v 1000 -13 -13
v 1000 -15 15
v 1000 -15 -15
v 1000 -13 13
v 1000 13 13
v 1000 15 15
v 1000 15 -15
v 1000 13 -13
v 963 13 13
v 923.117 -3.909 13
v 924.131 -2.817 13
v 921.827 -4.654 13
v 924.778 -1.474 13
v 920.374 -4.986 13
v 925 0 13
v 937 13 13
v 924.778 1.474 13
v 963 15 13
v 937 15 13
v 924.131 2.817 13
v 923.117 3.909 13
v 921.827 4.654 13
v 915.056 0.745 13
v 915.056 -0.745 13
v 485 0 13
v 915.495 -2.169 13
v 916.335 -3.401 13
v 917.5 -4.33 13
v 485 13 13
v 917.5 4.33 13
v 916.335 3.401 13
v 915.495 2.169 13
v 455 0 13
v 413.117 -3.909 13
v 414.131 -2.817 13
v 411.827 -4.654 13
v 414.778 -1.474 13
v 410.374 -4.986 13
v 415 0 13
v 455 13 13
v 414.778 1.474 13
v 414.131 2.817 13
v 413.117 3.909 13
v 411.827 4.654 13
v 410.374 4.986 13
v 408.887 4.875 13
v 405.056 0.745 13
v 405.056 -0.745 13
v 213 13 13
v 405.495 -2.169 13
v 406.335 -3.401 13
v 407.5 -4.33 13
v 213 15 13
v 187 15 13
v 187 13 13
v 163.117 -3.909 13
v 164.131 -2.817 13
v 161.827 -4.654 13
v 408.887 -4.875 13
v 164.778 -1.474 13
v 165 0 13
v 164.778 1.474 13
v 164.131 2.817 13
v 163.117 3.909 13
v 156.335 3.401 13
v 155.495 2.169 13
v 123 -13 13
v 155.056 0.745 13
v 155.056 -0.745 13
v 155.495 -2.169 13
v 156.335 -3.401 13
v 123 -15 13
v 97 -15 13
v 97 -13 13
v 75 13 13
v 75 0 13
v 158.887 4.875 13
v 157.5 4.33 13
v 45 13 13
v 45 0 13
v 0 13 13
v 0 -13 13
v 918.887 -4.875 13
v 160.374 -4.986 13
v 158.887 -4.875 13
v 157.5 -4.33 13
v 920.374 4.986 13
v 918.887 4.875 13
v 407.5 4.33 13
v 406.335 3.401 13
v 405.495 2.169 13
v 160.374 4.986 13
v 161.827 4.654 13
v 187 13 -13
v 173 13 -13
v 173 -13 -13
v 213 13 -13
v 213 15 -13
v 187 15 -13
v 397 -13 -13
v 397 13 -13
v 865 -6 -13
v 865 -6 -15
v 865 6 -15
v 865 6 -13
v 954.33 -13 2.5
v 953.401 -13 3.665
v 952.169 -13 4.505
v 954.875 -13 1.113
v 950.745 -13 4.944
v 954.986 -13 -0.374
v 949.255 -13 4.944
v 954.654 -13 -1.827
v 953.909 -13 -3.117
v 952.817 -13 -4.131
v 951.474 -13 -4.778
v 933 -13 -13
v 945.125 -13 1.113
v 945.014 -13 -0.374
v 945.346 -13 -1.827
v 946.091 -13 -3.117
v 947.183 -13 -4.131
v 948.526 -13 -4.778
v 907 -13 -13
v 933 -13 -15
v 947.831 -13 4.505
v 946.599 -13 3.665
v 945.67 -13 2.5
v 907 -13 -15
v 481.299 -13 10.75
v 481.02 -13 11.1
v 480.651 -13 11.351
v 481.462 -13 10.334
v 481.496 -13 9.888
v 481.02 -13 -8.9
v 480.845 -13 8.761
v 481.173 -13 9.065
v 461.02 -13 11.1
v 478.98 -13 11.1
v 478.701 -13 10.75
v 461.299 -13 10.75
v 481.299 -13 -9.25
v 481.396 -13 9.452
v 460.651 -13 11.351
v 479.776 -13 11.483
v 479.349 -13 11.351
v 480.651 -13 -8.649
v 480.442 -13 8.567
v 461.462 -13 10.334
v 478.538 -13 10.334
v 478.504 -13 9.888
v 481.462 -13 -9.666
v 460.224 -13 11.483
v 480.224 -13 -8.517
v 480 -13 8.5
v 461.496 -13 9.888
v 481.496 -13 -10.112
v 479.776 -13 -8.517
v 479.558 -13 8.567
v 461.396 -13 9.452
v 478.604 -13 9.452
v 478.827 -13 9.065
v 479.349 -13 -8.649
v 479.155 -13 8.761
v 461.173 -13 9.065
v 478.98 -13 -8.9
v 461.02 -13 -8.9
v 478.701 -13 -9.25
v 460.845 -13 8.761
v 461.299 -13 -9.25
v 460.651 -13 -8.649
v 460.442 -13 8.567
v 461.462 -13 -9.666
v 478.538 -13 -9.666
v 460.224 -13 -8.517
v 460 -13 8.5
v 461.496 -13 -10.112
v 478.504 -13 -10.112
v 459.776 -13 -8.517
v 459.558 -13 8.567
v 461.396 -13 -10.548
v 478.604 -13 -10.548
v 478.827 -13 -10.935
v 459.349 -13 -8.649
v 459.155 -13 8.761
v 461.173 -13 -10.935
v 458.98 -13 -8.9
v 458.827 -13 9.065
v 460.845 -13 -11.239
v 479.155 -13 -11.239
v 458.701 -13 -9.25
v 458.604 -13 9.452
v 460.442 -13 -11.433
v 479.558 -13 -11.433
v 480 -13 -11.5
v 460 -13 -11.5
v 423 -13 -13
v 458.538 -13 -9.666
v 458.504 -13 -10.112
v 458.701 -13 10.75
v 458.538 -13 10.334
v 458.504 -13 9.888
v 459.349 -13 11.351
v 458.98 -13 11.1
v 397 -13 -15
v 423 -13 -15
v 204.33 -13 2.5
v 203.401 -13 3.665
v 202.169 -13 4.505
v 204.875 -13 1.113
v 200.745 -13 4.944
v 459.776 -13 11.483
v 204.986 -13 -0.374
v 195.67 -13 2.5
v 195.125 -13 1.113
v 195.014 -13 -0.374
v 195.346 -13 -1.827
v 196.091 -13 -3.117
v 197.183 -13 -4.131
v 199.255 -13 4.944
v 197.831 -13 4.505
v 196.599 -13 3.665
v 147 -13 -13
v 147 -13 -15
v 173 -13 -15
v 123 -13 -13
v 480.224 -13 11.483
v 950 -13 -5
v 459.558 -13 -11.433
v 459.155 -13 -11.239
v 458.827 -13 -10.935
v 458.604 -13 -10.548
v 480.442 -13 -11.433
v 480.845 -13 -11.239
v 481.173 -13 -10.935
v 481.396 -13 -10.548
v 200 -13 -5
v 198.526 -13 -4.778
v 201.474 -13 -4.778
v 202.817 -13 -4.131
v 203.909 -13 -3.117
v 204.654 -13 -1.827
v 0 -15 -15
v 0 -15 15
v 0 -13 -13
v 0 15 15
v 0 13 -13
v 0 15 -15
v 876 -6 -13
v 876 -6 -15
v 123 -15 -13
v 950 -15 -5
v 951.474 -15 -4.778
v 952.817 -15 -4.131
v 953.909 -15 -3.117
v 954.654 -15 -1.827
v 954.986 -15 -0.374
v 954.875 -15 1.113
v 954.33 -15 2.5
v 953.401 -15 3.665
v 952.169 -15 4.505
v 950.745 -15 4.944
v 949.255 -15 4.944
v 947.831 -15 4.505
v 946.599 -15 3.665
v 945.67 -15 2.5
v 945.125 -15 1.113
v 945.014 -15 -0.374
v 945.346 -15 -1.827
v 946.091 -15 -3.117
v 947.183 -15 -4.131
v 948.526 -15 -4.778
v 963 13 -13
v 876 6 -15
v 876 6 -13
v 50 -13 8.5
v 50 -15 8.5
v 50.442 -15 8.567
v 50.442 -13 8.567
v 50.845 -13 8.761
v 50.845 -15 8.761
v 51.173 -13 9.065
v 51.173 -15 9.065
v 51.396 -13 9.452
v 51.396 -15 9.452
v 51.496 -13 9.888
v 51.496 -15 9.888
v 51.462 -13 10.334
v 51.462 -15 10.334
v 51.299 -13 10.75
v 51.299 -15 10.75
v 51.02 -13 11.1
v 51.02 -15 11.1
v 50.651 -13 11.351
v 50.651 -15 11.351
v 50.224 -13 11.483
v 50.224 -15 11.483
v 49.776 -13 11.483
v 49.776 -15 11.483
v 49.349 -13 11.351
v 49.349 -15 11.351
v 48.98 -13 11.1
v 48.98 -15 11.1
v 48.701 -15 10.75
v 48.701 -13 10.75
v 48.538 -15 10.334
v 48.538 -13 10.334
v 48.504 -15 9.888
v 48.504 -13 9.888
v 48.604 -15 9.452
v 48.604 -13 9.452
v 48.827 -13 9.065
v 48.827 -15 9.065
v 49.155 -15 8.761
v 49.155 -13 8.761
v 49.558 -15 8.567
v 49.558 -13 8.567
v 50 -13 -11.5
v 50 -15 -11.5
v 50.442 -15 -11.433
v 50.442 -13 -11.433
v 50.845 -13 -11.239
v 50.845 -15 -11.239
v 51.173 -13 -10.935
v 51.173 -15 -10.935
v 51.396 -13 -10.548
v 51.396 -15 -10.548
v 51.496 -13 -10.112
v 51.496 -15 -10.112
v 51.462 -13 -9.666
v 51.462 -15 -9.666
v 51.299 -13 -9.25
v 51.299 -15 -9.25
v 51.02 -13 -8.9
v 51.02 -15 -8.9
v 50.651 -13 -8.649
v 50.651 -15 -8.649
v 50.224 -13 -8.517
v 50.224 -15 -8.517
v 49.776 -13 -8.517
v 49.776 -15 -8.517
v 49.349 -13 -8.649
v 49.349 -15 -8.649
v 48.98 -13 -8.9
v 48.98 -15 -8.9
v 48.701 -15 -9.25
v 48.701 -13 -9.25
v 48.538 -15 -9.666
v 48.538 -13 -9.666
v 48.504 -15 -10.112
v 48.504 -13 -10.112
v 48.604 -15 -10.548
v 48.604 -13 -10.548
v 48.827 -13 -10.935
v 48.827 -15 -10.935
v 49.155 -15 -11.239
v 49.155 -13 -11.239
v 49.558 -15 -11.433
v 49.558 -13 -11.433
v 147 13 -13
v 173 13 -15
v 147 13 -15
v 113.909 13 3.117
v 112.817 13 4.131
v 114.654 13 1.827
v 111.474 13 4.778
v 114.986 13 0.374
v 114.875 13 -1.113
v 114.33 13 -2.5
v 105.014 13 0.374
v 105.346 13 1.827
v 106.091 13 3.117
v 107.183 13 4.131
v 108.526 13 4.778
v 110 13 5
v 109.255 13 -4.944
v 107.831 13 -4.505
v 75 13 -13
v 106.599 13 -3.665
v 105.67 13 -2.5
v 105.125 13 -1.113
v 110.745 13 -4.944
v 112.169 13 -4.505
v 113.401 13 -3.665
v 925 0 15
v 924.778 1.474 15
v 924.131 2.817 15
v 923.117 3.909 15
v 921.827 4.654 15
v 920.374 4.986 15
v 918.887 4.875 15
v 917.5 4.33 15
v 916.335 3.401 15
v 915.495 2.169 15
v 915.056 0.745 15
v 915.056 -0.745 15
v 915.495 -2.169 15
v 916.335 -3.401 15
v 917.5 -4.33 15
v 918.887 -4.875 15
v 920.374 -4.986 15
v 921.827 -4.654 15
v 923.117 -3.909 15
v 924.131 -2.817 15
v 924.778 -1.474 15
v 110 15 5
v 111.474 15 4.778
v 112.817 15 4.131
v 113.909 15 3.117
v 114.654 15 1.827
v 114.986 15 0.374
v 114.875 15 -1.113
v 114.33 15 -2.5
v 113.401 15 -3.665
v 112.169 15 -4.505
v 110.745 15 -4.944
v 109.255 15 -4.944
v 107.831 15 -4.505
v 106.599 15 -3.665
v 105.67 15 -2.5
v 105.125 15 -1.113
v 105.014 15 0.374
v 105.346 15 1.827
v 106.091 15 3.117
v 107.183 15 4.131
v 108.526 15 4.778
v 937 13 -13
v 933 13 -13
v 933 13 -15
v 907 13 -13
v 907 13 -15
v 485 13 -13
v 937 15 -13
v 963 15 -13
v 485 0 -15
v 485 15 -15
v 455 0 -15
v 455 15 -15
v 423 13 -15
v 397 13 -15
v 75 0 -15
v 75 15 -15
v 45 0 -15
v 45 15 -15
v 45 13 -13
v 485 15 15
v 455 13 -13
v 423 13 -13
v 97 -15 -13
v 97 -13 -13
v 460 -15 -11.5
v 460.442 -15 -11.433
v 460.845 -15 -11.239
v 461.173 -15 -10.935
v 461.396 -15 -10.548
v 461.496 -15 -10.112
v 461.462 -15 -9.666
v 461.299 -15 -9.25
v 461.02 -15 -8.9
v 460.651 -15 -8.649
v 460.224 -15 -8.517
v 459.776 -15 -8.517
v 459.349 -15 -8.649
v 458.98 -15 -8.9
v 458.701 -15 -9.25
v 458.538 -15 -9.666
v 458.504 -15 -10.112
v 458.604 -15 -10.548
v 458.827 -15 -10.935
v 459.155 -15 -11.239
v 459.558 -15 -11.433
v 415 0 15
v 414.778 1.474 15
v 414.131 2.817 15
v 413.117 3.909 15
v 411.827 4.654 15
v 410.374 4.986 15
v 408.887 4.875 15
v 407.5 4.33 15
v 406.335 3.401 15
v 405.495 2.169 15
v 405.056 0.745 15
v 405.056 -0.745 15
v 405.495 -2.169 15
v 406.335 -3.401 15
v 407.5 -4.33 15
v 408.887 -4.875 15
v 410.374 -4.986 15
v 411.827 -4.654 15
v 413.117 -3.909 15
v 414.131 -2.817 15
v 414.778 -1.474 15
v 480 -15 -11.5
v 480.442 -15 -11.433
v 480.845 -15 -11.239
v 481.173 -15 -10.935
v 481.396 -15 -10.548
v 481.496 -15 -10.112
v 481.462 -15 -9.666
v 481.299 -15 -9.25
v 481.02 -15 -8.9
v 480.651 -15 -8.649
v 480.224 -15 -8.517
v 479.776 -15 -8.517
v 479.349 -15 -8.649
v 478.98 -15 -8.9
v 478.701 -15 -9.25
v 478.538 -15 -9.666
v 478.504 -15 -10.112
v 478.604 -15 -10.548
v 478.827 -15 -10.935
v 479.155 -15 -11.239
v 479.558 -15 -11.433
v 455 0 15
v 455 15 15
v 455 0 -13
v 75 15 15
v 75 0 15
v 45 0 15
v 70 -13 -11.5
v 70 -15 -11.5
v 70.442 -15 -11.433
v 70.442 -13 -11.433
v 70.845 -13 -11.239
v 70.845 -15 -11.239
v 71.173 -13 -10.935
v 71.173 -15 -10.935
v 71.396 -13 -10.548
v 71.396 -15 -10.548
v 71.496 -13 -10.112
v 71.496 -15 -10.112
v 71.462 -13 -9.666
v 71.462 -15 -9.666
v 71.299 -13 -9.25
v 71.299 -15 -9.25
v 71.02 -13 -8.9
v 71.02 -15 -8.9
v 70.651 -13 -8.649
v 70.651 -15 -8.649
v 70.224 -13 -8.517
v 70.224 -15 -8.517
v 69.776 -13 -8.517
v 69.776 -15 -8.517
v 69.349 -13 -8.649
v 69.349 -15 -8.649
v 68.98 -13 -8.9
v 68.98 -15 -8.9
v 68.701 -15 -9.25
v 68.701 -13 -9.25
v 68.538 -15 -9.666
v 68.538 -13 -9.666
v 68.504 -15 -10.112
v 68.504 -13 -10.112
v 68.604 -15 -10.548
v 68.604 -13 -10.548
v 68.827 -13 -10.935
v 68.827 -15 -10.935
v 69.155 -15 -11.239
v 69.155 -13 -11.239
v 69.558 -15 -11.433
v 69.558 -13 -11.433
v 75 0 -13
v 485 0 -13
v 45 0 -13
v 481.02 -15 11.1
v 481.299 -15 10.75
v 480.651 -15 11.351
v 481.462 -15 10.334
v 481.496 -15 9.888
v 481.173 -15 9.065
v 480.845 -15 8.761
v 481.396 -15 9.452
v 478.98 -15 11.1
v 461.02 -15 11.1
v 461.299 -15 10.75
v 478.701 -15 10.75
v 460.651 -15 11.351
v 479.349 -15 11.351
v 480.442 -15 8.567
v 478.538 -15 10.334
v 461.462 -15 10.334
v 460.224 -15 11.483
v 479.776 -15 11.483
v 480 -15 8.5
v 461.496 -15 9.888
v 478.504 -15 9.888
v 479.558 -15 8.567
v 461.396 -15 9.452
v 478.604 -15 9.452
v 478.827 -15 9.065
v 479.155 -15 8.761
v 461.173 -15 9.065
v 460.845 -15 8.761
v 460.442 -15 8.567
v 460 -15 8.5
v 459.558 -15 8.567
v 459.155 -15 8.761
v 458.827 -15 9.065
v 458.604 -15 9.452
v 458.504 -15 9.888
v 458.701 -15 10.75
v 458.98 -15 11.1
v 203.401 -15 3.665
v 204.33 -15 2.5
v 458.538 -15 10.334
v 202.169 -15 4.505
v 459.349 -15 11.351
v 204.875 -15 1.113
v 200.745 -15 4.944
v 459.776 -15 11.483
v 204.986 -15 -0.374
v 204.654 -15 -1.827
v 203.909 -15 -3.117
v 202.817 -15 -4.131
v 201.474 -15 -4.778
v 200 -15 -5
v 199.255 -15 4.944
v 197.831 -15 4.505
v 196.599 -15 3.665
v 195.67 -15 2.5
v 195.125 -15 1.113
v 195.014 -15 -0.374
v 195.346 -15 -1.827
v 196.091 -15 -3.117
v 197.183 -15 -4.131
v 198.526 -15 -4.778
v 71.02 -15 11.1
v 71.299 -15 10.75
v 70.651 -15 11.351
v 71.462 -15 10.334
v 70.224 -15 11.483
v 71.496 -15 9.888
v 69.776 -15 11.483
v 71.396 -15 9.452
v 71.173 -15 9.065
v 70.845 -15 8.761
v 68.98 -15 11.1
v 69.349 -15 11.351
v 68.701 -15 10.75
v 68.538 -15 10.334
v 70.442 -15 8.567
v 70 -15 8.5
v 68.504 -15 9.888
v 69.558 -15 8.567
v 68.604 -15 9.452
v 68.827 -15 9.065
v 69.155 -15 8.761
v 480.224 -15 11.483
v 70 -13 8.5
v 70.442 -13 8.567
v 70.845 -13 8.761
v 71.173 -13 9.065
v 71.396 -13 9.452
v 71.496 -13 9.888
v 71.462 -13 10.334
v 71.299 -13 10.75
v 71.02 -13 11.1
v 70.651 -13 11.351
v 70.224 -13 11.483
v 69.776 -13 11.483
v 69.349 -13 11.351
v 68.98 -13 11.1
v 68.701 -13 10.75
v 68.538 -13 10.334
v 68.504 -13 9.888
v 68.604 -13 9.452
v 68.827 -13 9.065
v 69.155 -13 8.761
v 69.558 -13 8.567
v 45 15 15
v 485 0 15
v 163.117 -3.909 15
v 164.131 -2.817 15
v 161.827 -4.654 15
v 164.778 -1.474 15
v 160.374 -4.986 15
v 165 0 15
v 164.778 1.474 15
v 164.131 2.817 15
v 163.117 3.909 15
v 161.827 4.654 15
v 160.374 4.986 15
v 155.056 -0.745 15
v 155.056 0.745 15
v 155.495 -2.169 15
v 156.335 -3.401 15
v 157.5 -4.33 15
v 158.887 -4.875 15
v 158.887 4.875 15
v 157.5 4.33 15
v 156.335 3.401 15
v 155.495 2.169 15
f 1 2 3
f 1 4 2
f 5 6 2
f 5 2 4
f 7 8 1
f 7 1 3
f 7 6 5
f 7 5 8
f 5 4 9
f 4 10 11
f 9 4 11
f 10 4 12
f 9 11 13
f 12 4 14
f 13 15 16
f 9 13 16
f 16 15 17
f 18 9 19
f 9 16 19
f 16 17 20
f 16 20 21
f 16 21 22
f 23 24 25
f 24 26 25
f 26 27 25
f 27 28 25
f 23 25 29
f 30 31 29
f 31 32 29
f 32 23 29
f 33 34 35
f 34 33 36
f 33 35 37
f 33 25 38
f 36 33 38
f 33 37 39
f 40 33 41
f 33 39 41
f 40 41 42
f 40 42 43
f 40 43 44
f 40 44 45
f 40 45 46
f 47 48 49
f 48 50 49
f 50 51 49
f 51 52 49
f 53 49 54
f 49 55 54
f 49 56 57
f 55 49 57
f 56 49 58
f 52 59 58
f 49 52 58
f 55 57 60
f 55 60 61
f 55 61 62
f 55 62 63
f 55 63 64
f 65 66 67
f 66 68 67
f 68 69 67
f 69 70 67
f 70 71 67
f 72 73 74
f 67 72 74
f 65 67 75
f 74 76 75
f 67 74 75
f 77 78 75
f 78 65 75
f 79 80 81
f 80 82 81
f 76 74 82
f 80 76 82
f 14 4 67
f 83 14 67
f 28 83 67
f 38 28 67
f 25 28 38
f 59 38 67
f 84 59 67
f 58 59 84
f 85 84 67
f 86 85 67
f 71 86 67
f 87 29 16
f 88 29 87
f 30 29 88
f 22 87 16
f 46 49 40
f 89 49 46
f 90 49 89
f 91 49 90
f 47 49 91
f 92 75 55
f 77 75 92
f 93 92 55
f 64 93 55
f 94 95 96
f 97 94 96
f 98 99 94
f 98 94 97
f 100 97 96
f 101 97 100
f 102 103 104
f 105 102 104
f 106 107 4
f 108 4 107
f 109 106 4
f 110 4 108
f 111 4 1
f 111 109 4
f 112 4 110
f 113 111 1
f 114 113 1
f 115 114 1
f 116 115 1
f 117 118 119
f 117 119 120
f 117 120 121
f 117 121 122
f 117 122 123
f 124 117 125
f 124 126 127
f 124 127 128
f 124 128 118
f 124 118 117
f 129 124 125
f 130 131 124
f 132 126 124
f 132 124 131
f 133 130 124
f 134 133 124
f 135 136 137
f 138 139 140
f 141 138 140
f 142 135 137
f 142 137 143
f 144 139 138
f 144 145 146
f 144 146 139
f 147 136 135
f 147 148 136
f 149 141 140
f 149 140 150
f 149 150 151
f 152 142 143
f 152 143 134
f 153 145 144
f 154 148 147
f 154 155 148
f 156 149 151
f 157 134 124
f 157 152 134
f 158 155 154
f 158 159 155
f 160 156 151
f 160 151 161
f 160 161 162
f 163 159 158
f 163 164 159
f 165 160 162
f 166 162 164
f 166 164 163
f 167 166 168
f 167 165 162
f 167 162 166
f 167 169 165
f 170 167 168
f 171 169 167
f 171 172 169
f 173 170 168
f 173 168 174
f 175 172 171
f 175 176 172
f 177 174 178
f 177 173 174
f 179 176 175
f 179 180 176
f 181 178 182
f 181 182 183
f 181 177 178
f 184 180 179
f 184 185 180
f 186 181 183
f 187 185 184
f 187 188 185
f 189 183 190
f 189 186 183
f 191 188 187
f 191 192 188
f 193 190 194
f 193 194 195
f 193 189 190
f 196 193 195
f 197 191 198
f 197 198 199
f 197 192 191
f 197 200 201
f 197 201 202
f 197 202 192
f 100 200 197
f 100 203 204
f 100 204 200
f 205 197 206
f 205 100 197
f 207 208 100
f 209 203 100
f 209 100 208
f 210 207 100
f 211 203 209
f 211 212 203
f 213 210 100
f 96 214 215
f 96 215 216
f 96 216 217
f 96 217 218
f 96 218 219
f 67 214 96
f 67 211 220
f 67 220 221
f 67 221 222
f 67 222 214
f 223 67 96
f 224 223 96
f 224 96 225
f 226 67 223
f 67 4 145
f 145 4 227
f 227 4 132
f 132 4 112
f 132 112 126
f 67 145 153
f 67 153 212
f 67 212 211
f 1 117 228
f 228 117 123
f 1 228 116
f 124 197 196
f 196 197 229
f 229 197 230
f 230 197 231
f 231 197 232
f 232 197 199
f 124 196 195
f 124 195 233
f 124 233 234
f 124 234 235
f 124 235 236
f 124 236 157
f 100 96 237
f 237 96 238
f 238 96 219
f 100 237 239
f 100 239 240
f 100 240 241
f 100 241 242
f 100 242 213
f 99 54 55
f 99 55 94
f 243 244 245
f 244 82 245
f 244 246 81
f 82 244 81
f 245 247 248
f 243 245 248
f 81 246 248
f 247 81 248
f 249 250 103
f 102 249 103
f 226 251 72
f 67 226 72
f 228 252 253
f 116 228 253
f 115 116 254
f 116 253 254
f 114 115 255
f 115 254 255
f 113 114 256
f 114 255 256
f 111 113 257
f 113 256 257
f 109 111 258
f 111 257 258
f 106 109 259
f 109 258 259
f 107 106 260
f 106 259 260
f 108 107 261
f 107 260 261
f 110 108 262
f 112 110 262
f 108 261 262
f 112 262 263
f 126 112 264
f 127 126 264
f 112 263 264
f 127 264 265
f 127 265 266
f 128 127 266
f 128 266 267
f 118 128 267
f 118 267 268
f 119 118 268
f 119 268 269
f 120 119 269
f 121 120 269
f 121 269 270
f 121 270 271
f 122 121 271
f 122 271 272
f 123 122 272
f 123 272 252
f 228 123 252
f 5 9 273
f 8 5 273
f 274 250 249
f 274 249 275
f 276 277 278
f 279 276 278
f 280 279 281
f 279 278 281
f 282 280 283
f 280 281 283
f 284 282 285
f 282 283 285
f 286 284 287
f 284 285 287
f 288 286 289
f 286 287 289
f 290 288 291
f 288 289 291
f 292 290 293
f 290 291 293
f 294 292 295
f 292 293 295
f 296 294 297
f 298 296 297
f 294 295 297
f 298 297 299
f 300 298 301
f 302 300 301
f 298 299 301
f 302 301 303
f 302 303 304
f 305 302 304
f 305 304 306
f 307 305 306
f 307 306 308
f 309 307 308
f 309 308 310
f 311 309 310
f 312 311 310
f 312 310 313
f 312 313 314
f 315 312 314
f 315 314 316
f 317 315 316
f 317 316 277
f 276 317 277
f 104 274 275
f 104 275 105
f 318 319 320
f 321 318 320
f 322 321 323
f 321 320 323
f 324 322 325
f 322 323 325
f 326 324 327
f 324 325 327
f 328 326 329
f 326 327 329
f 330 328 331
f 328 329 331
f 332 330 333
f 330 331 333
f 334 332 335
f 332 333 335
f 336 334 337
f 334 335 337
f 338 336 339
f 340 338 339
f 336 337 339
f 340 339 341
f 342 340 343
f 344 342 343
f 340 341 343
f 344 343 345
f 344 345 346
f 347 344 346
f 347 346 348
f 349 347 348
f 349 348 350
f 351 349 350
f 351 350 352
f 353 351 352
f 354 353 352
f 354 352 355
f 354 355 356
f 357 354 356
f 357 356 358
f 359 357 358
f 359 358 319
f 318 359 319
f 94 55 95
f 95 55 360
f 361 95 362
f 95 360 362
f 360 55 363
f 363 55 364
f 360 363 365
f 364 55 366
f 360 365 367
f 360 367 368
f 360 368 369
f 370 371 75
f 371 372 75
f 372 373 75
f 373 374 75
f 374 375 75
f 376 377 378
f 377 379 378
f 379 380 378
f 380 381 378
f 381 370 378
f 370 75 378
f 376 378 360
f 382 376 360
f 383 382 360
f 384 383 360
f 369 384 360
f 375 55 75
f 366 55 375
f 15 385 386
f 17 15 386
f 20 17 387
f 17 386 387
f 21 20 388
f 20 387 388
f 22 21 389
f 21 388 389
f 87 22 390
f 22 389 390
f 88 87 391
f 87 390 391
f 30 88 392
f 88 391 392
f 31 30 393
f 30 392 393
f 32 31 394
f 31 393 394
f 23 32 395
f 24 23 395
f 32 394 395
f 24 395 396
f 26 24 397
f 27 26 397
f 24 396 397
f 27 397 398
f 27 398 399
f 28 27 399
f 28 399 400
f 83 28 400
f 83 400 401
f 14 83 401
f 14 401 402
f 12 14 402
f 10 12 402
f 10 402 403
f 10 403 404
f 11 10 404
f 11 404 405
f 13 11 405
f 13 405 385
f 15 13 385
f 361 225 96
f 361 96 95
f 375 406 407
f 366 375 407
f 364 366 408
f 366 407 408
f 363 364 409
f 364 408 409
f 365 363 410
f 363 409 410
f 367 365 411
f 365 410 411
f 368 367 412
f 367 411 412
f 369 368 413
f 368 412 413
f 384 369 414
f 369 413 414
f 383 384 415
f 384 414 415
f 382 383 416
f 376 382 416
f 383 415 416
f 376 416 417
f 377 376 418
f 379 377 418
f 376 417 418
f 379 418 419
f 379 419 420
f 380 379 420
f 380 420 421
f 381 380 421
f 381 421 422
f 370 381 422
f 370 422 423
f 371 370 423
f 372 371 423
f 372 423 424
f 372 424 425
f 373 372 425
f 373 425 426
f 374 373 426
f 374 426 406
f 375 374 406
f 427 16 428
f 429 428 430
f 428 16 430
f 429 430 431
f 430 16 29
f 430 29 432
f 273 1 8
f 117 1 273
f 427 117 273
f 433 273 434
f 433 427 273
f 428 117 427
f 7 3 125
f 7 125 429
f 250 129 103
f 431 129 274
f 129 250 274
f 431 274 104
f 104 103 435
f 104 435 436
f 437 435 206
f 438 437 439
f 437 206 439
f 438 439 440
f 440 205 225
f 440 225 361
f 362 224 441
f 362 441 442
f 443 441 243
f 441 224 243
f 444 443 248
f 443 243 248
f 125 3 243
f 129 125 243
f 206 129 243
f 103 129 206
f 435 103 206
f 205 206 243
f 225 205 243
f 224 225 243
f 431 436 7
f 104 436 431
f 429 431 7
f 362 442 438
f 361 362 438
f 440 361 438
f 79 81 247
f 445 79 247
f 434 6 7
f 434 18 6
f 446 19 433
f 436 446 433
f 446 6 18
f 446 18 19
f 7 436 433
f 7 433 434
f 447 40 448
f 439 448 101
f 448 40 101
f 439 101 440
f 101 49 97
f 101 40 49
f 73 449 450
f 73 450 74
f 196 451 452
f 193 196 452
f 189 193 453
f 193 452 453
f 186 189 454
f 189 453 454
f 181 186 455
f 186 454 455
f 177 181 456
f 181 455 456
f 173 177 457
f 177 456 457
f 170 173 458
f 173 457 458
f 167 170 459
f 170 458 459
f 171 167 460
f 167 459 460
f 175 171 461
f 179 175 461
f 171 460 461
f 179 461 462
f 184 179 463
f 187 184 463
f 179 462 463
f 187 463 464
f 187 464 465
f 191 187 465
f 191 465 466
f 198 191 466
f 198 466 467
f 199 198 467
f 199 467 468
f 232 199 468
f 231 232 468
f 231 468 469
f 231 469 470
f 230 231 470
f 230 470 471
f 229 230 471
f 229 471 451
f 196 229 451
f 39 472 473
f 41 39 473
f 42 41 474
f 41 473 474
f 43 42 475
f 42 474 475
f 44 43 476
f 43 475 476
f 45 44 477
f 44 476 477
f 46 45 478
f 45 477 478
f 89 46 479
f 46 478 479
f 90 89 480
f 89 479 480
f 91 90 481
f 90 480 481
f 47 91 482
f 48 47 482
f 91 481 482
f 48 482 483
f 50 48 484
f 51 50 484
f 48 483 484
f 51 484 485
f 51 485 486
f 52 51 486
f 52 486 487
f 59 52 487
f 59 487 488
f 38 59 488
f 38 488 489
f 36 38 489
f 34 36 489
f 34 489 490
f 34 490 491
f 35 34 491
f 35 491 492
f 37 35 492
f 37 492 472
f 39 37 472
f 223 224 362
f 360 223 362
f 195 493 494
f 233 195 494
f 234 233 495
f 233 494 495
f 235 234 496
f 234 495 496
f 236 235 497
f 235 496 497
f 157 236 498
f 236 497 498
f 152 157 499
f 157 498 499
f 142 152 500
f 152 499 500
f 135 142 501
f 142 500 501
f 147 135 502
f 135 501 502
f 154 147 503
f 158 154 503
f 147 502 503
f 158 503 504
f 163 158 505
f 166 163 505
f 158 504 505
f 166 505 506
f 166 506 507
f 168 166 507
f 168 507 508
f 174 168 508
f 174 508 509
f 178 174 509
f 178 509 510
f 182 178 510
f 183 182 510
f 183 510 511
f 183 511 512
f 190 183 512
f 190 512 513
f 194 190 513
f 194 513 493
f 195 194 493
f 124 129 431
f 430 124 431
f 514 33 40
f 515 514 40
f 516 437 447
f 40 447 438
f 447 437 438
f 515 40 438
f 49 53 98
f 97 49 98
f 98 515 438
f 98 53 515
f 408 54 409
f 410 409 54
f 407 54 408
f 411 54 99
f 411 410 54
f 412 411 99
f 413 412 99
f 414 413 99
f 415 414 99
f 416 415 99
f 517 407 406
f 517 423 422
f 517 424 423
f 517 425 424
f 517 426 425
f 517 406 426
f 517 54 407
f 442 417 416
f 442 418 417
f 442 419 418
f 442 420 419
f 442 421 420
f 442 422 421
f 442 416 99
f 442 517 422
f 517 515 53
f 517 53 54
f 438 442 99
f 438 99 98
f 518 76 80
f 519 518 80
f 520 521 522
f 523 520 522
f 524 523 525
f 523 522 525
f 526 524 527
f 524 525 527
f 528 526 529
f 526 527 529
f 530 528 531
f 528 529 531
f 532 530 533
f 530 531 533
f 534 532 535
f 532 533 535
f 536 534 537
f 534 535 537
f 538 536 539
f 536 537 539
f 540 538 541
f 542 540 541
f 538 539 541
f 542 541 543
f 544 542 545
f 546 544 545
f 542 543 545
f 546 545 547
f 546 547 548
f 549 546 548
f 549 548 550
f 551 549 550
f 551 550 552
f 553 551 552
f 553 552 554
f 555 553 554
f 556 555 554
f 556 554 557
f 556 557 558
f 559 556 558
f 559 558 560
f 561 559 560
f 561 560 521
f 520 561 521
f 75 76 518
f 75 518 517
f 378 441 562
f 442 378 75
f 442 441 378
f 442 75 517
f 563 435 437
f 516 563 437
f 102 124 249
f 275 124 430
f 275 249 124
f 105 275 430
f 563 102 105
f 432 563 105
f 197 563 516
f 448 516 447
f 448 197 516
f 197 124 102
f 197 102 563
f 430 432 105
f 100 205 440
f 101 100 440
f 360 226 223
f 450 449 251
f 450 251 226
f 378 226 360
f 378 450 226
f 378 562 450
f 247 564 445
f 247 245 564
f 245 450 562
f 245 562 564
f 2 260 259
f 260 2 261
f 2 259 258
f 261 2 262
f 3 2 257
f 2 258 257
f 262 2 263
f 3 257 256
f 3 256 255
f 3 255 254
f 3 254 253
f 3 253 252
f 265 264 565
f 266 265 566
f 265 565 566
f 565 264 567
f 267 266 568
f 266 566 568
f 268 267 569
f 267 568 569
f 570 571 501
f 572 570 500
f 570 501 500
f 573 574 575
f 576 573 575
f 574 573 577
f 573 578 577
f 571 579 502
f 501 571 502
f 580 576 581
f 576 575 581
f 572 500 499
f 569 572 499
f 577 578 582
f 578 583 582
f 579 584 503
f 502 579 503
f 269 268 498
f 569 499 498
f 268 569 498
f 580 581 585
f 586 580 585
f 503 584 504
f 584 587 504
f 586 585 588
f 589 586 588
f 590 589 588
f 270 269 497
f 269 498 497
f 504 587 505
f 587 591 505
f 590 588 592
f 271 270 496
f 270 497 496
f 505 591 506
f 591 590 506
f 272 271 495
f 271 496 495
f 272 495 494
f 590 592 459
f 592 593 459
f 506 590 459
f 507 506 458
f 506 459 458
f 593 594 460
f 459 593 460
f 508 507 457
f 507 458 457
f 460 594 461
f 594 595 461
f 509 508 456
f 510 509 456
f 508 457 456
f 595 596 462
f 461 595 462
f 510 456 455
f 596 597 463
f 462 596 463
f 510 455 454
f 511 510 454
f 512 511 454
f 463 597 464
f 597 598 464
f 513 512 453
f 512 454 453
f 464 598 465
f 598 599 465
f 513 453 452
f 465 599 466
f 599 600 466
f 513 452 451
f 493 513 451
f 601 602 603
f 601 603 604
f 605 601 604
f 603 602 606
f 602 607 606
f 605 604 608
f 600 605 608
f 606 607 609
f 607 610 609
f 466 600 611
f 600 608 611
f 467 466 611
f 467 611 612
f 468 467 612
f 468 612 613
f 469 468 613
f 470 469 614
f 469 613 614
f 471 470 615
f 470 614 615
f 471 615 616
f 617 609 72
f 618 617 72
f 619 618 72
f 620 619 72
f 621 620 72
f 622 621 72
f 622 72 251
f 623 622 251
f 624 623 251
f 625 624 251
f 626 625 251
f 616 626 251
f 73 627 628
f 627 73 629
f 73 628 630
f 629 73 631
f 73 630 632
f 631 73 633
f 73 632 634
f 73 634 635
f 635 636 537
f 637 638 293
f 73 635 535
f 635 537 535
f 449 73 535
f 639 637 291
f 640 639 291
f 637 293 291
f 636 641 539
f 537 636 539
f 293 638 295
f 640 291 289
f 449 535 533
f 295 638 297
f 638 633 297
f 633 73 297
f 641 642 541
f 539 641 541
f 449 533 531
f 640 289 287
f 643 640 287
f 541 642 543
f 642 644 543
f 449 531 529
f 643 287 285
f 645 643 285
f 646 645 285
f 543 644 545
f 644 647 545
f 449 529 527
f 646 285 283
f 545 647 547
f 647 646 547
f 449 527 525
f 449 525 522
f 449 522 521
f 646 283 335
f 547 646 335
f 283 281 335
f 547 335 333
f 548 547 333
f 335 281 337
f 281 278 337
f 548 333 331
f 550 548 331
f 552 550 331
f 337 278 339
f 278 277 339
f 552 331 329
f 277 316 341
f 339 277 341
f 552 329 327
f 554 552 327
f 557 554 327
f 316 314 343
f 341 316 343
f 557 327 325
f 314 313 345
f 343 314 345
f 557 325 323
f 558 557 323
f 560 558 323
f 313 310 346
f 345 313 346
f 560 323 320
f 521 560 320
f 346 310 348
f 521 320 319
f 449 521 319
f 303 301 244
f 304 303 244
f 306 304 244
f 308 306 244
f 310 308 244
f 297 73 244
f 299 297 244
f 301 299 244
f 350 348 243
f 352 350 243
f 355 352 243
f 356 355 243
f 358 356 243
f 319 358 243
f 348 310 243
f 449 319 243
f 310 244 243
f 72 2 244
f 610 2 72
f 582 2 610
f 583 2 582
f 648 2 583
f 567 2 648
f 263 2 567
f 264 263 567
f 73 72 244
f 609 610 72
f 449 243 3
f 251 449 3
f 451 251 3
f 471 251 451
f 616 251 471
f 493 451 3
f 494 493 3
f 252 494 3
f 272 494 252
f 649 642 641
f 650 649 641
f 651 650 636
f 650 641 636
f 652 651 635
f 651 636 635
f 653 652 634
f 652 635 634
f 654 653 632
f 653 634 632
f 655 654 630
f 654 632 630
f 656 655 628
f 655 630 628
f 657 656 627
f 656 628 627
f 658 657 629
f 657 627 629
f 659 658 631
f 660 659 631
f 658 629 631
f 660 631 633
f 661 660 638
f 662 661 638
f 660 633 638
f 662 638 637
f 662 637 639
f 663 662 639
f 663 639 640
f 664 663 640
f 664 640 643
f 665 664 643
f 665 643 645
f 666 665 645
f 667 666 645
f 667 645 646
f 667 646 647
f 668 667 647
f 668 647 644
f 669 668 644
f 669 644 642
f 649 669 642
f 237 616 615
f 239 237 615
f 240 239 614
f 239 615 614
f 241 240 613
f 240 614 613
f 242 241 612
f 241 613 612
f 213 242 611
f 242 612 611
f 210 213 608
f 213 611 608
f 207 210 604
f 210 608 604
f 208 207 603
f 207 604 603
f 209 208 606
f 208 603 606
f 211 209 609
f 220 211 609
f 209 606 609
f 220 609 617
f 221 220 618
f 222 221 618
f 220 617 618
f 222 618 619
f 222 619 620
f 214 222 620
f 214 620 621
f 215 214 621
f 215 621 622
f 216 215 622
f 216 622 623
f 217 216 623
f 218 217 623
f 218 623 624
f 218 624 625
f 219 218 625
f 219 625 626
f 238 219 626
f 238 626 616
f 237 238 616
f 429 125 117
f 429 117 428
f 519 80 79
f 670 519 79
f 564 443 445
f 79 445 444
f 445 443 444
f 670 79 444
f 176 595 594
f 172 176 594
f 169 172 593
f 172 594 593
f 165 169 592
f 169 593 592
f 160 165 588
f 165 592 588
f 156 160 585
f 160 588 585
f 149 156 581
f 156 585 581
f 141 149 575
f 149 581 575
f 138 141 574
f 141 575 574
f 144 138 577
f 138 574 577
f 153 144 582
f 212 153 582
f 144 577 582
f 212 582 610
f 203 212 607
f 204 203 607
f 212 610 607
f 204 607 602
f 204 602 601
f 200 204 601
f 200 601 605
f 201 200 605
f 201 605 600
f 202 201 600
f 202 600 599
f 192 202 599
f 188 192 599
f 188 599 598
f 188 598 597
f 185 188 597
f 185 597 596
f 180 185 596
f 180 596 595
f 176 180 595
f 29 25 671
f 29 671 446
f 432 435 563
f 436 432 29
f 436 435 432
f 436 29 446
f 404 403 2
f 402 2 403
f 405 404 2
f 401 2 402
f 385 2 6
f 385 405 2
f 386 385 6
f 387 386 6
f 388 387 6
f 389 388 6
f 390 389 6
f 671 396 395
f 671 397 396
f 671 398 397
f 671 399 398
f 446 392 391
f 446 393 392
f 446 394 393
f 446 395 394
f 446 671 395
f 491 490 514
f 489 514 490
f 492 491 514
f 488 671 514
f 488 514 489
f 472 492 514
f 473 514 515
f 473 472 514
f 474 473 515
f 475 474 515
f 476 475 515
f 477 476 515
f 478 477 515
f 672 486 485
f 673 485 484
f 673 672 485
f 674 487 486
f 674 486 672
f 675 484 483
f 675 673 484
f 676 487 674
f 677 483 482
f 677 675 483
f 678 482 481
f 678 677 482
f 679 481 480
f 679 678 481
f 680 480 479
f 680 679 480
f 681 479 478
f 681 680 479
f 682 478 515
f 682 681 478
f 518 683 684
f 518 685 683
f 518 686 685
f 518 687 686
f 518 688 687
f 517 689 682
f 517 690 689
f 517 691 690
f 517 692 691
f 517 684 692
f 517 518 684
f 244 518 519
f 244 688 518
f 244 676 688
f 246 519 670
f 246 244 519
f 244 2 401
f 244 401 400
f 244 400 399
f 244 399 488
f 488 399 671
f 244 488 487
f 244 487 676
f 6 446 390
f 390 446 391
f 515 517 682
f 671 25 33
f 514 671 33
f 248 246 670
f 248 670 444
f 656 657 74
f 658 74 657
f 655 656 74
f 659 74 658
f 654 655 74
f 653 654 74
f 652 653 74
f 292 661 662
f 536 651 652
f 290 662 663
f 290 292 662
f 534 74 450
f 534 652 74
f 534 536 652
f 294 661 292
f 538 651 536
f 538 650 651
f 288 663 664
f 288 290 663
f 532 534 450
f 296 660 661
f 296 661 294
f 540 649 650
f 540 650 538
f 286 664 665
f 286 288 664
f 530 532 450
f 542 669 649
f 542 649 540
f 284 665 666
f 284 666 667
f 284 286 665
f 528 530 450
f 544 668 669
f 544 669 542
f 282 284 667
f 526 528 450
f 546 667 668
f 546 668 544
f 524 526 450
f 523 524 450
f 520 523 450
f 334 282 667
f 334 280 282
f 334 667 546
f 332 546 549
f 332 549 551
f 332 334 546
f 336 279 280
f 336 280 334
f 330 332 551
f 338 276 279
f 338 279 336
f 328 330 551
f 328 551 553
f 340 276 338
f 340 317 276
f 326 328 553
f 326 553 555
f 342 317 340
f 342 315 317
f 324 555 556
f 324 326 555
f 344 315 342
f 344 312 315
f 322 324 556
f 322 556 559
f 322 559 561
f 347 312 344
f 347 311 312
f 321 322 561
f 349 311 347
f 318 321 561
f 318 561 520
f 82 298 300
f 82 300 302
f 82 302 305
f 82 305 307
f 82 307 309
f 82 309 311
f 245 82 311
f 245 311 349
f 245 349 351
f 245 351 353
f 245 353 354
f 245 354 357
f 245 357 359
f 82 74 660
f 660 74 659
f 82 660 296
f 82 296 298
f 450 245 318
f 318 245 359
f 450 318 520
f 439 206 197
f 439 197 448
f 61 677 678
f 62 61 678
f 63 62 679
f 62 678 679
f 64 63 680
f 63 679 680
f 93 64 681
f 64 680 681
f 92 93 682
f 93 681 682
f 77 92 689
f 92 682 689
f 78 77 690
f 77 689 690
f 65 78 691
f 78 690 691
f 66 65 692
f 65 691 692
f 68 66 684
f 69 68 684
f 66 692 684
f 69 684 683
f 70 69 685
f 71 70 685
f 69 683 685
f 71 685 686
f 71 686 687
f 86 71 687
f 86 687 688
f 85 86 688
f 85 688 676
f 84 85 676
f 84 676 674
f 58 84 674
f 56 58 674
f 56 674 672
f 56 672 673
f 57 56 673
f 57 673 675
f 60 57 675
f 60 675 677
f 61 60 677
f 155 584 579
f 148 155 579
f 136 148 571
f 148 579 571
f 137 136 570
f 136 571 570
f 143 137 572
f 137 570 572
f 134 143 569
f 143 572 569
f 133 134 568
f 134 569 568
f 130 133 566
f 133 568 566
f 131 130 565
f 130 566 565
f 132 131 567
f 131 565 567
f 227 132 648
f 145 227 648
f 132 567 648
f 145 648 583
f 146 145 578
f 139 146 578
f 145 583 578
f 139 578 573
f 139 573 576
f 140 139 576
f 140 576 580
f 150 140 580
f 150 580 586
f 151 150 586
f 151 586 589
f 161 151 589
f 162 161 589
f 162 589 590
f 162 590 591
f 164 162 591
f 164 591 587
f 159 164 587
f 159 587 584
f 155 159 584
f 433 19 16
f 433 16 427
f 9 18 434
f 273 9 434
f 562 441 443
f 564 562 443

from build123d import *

# Parameters (mm, degrees)
SKETCH_2_W          = 30
SKETCH_2_H          = 30
SKETCH_2_W_2        = 26
SKETCH_2_H_2        = 26
EXTRUDE_2_DEPTH     = 1000
SKETCH_3_W          = 30
SKETCH_3_H          = 15
CUT_EXTRUDE_1_DEPTH = 30
SKETCH_4_W          = 26
SKETCH_4_H          = 26
SKETCH_4_W_2        = 11
SKETCH_4_H_2        = 12
CUT_EXTRUDE_2_DEPTH = 15
SKETCH_5_R          = 5
CUT_EXTRUDE_3_DEPTH = 15
SKETCH_6_R          = 1.5
CUT_EXTRUDE_4_DEPTH = 15
SKETCH_8_R          = 5
SKETCH_8_W          = 26
SKETCH_8_H          = 26
CUT_EXTRUDE_5_DEPTH = 15
SKETCH_9_R          = 5
SKETCH_9_W          = 26
SKETCH_9_H          = 26
CUT_EXTRUDE_6_DEPTH = 15


with BuildPart() as part:
    # 草图2 → 凸台-拉伸2 (new body)
    with BuildSketch(Plane(origin=(0, 0, 0), x_dir=(0, 0, -1), z_dir=(1, 0, 0))):
        Rectangle(SKETCH_2_W, SKETCH_2_H)
        Rectangle(SKETCH_2_W_2, SKETCH_2_H_2, mode=Mode.SUBTRACT)
    extrude(amount=EXTRUDE_2_DEPTH)

    # 草图3 → 切除-拉伸1 (cut)
    with BuildSketch(Plane(origin=(0, 0, -15), x_dir=(-1, 0, 0), z_dir=(0, 0, -1))):
        with Locations((-470, 7.5)):
            Rectangle(SKETCH_3_W, SKETCH_3_H)
        with Locations((-60, 7.5)):
            Rectangle(SKETCH_3_W, SKETCH_3_H)
    extrude(amount=-CUT_EXTRUDE_1_DEPTH, mode=Mode.SUBTRACT)

    # 草图4 → 切除-拉伸2 (cut)
    with BuildSketch(Plane(origin=(0, 0, -15), x_dir=(-1, 0, 0), z_dir=(0, 0, -1))):
        with Locations((-920, 0)):
            Rectangle(SKETCH_4_W, SKETCH_4_H)
        with Locations((-410, 0)):
            Rectangle(SKETCH_4_W, SKETCH_4_H)
        with Locations((-160, 0)):
            Rectangle(SKETCH_4_W, SKETCH_4_H)
        with Locations((-870.5, 0)):
            Rectangle(SKETCH_4_W_2, SKETCH_4_H_2)
    extrude(amount=-CUT_EXTRUDE_2_DEPTH, mode=Mode.SUBTRACT)

    # 草图5 → 切除-拉伸3 (cut)
    with BuildSketch(Plane.XY.offset(15)):
        with Locations((160, 0)):
            Circle(SKETCH_5_R)
        with Locations((410, 0)):
            Circle(SKETCH_5_R)
        with Locations((920, 0)):
            Circle(SKETCH_5_R)
    extrude(amount=-CUT_EXTRUDE_3_DEPTH, mode=Mode.SUBTRACT)

    # 草图6 → 切除-拉伸4 (cut)
    with BuildSketch(Plane.XZ.offset(15)):
        with Locations(Location((50, 10, 0), (0, 0, 270))):
            Circle(SKETCH_6_R)
        with Locations(Location((70, 10, 0), (0, 0, 270))):
            Circle(SKETCH_6_R)
        with Locations(Location((50, -10, 0), (0, 0, 270))):
            Circle(SKETCH_6_R)
        with Locations(Location((70, -10, 0), (0, 0, 270))):
            Circle(SKETCH_6_R)
        with Locations(Location((460, 10, 0), (0, 0, 270))):
            Circle(SKETCH_6_R)
        with Locations(Location((480, 10, 0), (0, 0, 270))):
            Circle(SKETCH_6_R)
        with Locations(Location((460, -10, 0), (0, 0, 270))):
            Circle(SKETCH_6_R)
        with Locations(Location((480, -10, 0), (0, 0, 270))):
            Circle(SKETCH_6_R)
    extrude(amount=-CUT_EXTRUDE_4_DEPTH, mode=Mode.SUBTRACT)

    # 草图8 → 切除-拉伸5 (cut)
    with BuildSketch(Plane(origin=(0, 15, 0), x_dir=(1, 0, 0), z_dir=(0, 1, 0))):
        with Locations(Location((110, 0, 0), (0, 0, 270))):
            Circle(SKETCH_8_R)
        with Locations((950, 0)):
            Rectangle(SKETCH_8_W, SKETCH_8_H)
        with Locations((200, 0)):
            Rectangle(SKETCH_8_W, SKETCH_8_H)
    extrude(amount=-CUT_EXTRUDE_5_DEPTH, mode=Mode.SUBTRACT)

    # 草图9 → 切除-拉伸6 (cut)
    with BuildSketch(Plane.XZ.offset(15)):
        with Locations(Location((950, 0, 0), (0, 0, 270))):
            Circle(SKETCH_9_R)
        with Locations(Location((200, 0, 0), (0, 0, 270))):
            Circle(SKETCH_9_R)
        with Locations((110, 0)):
            Rectangle(SKETCH_9_W, SKETCH_9_H)
    extrude(amount=-CUT_EXTRUDE_6_DEPTH, mode=Mode.SUBTRACT)


solid = part.part
